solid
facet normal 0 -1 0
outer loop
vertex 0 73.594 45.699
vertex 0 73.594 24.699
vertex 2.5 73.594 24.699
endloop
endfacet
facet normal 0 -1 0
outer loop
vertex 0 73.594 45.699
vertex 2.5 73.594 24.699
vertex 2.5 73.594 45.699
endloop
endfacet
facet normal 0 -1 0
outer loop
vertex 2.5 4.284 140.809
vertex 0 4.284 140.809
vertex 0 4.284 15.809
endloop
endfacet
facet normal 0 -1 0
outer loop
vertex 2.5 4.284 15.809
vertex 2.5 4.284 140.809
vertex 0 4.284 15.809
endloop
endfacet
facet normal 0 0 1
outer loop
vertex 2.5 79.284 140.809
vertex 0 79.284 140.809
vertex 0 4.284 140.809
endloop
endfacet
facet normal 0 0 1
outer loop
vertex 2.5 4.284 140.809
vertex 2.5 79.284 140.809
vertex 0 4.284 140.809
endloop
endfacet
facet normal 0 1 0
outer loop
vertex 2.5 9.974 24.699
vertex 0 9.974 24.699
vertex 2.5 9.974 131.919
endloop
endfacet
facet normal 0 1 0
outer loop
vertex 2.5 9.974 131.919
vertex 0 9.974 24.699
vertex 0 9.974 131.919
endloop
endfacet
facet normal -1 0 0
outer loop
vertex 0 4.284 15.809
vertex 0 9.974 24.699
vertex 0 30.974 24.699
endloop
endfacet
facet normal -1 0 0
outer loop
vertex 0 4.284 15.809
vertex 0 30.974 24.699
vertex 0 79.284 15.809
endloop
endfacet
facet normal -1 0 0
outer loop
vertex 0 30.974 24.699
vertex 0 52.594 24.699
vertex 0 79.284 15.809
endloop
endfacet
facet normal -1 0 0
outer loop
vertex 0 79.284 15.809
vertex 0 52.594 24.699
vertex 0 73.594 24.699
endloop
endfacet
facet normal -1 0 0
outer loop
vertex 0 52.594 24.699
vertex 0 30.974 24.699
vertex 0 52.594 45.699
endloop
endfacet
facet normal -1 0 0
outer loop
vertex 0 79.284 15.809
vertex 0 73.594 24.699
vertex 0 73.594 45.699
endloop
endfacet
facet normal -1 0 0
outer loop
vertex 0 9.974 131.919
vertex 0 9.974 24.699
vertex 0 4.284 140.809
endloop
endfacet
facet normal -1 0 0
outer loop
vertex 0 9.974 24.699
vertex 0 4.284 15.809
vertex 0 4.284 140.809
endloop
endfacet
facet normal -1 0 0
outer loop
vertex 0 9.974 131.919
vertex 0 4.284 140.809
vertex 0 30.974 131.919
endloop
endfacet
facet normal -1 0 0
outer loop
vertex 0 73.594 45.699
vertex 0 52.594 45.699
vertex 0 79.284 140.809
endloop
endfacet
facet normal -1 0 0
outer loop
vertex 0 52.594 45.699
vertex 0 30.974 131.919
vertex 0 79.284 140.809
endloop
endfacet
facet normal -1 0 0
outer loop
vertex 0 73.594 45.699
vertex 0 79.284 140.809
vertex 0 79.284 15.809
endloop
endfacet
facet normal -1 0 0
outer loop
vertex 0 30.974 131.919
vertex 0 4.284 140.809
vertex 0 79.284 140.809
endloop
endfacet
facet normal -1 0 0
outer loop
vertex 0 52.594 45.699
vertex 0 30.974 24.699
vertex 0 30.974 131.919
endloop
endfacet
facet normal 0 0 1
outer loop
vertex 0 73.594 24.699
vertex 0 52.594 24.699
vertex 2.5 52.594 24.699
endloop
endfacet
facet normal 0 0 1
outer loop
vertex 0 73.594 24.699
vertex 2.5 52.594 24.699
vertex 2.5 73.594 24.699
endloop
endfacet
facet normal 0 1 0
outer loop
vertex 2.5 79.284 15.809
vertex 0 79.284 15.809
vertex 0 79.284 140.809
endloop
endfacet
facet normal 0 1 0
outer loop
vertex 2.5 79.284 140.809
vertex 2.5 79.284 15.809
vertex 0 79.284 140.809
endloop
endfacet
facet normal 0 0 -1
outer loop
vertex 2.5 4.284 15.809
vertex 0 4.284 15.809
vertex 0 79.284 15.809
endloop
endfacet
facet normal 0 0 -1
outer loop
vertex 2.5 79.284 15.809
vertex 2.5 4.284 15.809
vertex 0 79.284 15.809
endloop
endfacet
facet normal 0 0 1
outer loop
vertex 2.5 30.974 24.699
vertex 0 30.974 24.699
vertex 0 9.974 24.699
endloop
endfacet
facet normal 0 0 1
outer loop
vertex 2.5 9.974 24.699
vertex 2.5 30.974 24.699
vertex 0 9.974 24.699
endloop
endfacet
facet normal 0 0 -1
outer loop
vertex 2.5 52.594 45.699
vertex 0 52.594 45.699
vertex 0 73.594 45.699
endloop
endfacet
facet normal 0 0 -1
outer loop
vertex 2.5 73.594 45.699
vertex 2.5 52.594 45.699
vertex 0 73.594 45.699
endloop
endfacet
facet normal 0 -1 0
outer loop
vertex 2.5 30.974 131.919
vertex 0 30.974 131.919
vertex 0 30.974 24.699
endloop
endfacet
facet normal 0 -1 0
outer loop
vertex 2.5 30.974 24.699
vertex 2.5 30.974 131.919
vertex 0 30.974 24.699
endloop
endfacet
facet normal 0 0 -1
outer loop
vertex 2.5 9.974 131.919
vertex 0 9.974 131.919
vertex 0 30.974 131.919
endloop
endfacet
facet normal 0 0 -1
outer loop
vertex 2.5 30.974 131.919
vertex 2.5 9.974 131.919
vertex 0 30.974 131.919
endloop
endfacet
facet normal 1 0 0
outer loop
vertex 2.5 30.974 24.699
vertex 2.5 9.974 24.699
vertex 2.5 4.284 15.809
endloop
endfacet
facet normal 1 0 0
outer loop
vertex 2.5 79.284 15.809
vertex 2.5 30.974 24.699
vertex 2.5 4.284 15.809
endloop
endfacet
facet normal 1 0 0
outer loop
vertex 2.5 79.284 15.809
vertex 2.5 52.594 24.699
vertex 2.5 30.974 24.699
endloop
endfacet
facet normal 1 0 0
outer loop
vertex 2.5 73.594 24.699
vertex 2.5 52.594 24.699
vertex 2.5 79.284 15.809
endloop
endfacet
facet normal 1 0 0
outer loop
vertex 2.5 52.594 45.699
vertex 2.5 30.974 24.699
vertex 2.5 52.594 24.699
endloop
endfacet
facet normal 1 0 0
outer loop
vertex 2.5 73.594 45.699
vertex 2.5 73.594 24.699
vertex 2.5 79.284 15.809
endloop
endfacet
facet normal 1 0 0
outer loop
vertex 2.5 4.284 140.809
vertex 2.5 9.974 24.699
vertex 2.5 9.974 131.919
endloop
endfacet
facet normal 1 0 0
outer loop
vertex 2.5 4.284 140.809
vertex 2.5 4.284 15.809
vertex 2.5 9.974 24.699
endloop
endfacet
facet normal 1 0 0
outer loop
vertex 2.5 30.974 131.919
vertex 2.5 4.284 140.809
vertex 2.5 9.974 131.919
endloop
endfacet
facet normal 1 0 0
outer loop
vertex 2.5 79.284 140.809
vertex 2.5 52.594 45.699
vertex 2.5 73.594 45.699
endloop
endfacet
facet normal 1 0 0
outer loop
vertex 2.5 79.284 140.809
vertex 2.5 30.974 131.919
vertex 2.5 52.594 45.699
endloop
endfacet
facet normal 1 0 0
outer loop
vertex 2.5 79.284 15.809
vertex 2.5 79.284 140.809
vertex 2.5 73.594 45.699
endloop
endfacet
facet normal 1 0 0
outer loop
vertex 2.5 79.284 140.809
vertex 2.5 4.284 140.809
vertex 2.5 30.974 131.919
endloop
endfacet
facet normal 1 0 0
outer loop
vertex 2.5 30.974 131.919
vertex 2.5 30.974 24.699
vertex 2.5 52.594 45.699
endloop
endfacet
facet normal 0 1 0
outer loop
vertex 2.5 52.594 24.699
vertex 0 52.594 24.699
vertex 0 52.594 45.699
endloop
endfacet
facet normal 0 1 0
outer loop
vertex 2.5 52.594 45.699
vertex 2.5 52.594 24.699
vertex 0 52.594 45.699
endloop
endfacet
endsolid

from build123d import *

# Parameters (mm, degrees)
F0_W     = 13.9900064
F0_H     = 3.81
F0_W_2   = 21
F0_H_2   = 21
F1_DEPTH = 2.5


# Not quite as in the source:
# - a feature names something its author has since deleted; it is built from what else it names


with BuildPart() as f1:
    # F0 (on Right) → F1 (new body)
    with BuildSketch(Plane.YZ):
        Polygon((4.2842663067, 140.8092032793), (4.2842663067, 15.8092032793), (79.2842663067, 15.8092032793), (79.2842663067, 140.8092032793), (75.4742663067, 140.8092032793), (75.4742663067, 136.9992032793), (75.4742663067, 19.6192032793), (8.0942663067, 19.6192032793), (8.0942663067, 136.9992032793), (55.7998448917, 136.9992032793), (61.4842599067, 136.9992032793), (61.4842599067, 140.8092032793), (55.7998448917, 140.8092032793), (11.2942599067, 140.8092032793), align=None)
        with Locations((68.4792631067, 138.9042032793)):
            Rectangle(F0_W, F0_H)
        Polygon((75.4742663067, 19.6192032793), (75.4742663067, 136.9992032793), (61.4842599067, 136.9992032793), (55.7998448917, 136.9992032793), (8.0942663067, 136.9992032793), (8.0942663067, 19.6192032793), align=None)
        Polygon((9.9742727067, 45.6992032793), (9.9742727067, 131.9192032793), (30.9742727067, 131.9192032793), (30.9742727067, 110.9192032793), (30.9742727067, 45.6992032793), (30.9742727067, 24.6992032793), (9.9742727067, 24.6992032793), align=None, mode=Mode.SUBTRACT)
        with Locations((63.0942599067, 35.1992032793)):
            Rectangle(F0_W_2, F0_H_2, mode=Mode.SUBTRACT)
    extrude(amount=F1_DEPTH)


solid = f1.part
